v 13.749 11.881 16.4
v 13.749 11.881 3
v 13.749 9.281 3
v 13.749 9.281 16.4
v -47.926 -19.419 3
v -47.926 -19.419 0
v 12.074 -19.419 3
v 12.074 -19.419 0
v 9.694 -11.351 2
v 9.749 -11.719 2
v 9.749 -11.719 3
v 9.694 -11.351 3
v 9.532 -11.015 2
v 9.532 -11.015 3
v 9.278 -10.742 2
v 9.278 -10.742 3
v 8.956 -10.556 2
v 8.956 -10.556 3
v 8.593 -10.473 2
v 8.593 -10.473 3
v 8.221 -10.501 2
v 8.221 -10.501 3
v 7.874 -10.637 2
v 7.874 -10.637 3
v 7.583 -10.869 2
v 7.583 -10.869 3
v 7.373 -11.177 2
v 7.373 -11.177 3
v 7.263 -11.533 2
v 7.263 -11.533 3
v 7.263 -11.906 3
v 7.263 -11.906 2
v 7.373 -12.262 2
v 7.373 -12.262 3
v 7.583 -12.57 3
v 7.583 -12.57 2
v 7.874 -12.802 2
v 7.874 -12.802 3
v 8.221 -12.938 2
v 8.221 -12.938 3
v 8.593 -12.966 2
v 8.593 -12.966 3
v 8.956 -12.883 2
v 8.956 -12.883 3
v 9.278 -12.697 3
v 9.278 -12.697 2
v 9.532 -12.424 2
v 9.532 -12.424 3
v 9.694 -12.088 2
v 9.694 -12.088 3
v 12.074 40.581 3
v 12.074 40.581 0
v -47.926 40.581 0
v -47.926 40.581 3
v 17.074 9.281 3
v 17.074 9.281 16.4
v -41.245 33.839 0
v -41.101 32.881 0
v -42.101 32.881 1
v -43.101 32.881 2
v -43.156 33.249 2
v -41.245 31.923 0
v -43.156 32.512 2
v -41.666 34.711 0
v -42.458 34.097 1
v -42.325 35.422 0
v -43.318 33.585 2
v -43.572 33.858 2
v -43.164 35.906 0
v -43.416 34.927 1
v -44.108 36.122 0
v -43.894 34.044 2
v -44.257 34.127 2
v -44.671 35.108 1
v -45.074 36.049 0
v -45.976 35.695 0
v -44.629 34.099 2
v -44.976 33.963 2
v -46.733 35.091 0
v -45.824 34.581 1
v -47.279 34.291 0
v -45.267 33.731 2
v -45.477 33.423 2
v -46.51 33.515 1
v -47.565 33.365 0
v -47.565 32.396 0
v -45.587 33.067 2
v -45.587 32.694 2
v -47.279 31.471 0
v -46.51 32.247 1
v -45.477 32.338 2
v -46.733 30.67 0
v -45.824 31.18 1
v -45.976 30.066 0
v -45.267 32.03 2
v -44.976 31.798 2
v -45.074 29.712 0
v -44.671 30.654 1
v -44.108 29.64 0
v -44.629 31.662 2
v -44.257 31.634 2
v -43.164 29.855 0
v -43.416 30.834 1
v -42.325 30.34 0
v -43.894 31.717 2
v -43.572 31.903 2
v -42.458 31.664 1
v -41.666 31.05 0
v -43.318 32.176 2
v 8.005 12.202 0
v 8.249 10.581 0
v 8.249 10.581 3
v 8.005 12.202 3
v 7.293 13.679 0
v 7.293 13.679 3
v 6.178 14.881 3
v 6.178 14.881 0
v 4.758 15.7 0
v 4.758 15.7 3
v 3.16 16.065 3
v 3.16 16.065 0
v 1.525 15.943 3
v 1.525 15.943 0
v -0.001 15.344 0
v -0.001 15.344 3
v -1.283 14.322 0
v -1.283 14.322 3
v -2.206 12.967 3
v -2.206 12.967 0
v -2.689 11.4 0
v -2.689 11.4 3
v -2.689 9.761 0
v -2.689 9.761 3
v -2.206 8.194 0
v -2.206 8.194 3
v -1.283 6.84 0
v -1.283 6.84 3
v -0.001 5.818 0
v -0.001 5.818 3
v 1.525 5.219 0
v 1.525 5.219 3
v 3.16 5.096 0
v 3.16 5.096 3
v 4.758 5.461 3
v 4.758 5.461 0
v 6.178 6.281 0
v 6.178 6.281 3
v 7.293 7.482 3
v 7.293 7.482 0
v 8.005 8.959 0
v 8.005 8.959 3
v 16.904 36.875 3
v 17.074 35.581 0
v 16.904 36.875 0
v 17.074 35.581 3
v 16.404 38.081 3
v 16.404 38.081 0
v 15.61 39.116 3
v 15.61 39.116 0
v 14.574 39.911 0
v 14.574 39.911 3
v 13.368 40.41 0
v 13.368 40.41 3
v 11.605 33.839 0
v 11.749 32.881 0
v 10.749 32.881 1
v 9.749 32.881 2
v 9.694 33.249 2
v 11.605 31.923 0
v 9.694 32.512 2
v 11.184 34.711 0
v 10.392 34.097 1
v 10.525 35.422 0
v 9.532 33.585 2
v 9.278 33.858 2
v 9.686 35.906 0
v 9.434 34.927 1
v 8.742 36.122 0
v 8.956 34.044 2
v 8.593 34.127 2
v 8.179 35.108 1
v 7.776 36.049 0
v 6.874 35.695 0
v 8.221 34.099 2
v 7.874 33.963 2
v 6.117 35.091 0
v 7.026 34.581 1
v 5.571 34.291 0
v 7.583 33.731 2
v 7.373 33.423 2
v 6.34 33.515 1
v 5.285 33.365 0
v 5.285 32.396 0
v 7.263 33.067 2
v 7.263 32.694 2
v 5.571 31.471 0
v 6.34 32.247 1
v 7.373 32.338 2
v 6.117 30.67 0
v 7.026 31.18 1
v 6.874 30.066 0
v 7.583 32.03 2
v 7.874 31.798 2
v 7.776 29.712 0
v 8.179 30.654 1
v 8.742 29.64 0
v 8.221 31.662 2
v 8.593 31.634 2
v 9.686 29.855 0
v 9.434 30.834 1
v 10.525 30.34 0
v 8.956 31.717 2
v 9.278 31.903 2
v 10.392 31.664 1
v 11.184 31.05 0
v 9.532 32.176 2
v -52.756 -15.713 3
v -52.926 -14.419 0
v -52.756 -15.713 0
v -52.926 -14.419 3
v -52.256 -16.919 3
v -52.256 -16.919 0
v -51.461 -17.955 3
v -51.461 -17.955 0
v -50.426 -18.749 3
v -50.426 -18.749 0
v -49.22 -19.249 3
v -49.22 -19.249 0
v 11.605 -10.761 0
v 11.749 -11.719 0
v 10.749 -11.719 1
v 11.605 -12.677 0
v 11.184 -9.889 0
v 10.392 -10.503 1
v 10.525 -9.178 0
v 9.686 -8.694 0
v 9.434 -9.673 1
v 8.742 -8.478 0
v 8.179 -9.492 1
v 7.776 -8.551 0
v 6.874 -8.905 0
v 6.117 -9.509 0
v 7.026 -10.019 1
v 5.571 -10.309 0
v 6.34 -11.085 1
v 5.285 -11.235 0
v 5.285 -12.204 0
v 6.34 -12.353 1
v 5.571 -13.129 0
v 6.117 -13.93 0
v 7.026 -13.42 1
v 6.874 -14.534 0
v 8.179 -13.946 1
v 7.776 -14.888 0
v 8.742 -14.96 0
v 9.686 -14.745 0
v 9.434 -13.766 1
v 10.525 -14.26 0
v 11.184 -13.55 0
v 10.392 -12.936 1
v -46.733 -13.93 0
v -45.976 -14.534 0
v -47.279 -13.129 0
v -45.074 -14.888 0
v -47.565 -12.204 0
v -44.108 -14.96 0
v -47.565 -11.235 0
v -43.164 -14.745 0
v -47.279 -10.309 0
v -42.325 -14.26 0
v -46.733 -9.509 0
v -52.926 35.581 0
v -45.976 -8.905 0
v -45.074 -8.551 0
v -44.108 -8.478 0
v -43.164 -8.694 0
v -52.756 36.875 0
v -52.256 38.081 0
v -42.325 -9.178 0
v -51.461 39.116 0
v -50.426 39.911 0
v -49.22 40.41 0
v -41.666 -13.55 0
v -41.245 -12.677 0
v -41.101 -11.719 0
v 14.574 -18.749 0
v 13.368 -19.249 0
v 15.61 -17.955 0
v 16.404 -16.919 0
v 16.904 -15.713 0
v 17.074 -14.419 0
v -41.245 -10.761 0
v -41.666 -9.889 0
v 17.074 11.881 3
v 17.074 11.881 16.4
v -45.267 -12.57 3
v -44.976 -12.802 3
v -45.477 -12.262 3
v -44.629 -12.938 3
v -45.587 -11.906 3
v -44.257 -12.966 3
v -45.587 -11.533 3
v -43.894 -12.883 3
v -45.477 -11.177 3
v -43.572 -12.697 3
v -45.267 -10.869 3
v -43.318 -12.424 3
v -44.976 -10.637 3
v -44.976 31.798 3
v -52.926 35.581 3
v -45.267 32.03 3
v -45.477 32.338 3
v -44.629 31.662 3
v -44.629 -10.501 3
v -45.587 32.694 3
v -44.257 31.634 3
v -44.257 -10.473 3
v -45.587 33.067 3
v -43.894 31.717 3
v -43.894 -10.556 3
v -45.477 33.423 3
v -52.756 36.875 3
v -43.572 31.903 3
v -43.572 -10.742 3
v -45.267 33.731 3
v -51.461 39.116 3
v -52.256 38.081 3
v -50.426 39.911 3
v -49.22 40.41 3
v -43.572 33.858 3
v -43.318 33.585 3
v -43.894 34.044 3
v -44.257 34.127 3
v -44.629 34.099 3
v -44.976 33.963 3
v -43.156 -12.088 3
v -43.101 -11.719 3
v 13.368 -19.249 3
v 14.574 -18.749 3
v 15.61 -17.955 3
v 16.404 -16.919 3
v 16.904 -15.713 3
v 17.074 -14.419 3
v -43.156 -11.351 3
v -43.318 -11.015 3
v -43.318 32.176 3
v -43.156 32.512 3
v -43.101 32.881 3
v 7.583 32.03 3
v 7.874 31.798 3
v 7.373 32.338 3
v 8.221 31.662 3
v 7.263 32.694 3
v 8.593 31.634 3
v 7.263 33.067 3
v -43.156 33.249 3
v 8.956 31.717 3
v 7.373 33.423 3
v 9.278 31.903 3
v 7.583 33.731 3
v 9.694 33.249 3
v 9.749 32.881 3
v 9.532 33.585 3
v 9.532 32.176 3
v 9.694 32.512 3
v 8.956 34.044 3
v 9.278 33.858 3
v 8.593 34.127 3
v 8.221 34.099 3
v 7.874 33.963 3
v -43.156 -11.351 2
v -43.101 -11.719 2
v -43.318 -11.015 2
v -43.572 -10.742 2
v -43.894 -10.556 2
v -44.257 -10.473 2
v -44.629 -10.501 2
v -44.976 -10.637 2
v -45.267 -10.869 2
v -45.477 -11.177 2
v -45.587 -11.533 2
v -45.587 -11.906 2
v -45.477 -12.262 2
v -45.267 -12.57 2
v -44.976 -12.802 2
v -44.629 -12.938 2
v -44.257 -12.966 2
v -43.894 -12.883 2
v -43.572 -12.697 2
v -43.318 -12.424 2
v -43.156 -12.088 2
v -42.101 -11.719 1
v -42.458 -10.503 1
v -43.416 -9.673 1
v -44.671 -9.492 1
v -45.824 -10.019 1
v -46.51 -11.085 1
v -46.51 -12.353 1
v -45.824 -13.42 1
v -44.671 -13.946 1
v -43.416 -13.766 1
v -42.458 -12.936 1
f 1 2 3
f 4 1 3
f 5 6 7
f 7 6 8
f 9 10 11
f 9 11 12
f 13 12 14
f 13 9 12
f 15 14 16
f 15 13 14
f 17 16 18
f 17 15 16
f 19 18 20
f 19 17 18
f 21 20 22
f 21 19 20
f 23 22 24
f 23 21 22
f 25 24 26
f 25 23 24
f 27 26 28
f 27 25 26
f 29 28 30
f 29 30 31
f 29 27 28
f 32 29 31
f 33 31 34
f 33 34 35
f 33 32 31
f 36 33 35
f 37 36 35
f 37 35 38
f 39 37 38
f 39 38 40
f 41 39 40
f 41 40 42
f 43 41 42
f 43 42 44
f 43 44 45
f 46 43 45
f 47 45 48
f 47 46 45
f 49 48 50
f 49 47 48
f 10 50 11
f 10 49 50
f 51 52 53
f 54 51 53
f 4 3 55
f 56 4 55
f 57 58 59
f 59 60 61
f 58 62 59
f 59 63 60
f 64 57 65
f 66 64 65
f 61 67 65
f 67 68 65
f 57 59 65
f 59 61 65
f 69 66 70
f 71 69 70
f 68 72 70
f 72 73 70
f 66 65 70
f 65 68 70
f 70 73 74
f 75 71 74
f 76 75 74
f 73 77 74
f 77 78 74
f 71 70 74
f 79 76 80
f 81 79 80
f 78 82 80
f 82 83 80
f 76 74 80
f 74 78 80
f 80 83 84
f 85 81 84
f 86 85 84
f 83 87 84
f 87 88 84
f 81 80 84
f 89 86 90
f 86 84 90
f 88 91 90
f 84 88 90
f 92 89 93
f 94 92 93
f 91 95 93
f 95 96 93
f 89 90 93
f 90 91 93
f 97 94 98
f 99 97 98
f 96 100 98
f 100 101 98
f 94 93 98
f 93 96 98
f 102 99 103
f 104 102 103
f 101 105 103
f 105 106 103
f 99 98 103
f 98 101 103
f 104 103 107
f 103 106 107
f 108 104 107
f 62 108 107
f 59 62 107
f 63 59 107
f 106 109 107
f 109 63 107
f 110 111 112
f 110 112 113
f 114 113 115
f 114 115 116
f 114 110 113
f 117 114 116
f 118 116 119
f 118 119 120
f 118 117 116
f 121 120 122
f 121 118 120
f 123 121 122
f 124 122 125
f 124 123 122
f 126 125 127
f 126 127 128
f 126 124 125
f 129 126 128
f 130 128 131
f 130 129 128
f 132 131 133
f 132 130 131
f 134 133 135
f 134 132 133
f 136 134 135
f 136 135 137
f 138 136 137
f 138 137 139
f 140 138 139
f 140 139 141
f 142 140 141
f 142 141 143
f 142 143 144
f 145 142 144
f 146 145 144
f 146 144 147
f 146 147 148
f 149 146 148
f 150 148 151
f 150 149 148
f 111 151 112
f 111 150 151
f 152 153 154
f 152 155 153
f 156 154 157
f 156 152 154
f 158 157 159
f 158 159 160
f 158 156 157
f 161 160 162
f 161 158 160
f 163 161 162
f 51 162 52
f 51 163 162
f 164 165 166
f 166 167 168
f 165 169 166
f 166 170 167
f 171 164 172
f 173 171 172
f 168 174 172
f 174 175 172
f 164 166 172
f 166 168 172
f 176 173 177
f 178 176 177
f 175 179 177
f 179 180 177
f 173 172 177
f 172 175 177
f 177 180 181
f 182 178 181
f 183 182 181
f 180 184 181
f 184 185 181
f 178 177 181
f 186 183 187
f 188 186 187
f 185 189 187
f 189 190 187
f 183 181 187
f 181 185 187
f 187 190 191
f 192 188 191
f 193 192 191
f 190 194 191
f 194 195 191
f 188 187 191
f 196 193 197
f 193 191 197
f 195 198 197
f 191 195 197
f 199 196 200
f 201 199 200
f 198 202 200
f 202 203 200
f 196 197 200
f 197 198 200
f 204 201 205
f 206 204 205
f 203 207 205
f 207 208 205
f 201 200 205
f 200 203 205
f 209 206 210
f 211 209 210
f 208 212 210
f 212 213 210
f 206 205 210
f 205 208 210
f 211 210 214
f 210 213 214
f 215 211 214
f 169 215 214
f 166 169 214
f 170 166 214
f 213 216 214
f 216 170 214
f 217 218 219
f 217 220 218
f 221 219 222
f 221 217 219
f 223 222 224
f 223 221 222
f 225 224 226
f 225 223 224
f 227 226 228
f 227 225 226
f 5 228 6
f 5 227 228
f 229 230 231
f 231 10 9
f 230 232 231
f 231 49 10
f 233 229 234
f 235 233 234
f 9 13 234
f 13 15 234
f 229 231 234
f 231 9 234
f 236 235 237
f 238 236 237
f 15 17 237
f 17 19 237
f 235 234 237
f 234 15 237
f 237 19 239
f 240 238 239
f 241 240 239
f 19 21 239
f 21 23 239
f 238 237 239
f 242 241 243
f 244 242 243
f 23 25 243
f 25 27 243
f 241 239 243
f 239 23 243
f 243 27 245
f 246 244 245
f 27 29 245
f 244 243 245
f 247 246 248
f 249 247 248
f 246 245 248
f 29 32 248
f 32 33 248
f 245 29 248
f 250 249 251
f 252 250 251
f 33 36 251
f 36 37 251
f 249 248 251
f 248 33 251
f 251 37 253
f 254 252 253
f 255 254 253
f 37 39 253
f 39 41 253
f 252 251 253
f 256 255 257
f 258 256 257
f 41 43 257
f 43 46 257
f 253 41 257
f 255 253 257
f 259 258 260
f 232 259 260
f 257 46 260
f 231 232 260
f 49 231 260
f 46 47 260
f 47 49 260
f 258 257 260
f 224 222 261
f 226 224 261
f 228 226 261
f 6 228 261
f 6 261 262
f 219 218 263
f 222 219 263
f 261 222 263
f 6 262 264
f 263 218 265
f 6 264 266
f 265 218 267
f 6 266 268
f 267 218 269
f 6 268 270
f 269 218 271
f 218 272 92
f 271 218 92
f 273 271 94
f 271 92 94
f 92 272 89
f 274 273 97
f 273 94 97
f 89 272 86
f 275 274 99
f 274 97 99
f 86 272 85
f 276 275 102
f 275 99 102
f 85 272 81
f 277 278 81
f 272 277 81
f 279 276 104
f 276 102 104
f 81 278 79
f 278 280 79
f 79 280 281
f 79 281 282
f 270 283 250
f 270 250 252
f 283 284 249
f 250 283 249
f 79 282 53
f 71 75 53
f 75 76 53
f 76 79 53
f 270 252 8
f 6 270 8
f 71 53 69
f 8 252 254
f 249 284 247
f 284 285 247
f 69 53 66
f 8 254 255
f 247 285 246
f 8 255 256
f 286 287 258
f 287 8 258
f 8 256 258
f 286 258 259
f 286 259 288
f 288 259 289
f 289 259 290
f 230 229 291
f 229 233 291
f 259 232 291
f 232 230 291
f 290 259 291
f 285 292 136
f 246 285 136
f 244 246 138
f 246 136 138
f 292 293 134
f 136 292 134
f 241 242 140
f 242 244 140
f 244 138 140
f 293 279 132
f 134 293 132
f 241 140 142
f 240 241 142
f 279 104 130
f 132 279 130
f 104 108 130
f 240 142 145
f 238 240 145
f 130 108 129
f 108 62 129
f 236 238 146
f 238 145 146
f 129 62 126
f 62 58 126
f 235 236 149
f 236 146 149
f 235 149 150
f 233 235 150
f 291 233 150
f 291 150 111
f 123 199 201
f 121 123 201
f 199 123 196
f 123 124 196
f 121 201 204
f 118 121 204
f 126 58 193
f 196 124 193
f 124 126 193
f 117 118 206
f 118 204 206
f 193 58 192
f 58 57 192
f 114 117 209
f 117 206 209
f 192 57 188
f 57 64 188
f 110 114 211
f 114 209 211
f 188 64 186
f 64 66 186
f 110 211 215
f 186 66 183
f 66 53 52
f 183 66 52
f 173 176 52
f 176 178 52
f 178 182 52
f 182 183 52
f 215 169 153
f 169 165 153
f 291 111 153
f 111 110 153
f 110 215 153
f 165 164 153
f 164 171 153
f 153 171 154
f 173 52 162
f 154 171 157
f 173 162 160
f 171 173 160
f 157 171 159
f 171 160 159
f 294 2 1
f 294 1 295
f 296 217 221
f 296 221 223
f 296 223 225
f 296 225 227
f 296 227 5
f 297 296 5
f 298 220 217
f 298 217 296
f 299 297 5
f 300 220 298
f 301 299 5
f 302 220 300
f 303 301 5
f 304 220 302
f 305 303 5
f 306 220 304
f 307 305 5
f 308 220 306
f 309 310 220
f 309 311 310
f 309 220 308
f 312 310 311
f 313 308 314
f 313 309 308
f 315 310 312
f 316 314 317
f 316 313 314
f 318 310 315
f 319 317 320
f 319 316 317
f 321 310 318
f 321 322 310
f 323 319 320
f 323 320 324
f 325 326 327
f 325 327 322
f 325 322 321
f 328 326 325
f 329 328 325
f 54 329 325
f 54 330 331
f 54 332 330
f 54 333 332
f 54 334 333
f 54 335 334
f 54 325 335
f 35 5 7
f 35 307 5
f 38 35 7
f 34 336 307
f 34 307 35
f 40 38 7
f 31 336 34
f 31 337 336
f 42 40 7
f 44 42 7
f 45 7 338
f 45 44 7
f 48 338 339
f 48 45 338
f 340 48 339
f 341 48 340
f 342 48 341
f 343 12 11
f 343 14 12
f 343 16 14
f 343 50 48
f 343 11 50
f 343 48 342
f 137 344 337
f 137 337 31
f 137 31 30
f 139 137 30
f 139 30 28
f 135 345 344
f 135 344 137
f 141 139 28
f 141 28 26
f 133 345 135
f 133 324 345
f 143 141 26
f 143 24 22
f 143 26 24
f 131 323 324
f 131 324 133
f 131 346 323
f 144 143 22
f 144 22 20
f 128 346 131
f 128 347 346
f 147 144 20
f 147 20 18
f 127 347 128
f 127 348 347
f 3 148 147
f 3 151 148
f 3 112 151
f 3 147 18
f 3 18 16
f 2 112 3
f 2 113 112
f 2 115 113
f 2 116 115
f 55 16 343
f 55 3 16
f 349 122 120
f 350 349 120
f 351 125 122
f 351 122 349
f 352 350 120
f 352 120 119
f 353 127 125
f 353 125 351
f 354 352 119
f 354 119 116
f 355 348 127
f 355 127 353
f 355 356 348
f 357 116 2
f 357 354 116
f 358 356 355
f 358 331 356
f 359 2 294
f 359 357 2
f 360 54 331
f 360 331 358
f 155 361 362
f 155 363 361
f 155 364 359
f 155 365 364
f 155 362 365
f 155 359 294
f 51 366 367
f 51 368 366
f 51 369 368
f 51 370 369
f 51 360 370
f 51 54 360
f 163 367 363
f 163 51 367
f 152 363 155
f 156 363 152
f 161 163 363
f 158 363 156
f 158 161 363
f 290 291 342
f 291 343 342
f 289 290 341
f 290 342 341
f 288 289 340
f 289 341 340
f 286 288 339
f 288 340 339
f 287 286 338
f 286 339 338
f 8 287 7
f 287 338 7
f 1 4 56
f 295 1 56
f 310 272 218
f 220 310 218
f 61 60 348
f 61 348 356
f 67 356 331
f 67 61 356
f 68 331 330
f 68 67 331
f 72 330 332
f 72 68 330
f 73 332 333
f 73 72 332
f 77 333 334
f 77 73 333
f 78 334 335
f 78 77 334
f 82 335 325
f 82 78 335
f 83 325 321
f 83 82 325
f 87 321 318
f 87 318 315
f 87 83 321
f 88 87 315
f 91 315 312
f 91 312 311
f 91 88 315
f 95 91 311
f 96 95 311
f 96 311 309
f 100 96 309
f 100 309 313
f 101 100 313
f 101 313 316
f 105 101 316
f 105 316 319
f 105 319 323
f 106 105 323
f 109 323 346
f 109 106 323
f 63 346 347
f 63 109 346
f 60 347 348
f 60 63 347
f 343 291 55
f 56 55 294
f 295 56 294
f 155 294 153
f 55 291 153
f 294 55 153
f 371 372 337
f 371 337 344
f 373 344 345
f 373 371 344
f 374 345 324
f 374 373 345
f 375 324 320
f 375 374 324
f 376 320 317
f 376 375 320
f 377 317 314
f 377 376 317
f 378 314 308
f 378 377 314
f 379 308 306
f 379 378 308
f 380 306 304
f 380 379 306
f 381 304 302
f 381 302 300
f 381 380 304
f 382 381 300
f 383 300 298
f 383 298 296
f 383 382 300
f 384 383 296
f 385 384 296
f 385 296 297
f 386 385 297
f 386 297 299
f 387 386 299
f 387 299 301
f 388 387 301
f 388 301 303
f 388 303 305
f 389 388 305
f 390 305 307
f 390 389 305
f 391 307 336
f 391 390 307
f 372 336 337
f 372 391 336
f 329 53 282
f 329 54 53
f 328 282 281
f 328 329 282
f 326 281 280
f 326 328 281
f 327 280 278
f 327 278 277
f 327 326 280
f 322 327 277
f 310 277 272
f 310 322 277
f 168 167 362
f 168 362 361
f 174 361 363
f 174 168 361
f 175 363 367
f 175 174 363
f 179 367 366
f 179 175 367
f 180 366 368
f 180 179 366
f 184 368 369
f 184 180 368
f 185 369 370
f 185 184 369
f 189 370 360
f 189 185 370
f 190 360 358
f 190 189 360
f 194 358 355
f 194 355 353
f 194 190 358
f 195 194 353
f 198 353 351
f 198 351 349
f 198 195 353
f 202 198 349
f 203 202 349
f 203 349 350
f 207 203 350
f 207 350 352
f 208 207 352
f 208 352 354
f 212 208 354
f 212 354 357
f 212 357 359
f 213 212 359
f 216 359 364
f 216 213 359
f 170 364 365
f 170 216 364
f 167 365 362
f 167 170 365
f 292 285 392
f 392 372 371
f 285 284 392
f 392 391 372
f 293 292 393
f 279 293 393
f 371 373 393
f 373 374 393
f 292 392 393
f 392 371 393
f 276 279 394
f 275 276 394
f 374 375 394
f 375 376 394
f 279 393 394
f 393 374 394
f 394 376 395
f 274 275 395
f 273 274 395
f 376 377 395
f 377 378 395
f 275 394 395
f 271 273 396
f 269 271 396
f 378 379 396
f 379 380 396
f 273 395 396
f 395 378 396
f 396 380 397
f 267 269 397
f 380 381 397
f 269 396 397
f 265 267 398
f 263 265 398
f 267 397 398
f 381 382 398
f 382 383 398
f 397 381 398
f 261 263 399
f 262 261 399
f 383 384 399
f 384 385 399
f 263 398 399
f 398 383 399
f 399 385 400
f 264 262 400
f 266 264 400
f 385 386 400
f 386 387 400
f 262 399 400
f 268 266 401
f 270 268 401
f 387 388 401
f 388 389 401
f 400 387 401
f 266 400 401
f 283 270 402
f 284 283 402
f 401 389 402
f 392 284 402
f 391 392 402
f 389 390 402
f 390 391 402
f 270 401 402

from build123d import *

# Parameters (mm, degrees)
F0_R     = 1.25
F0_R_2   = 5.5
F1_DEPTH = 3
F2_W     = 3.325
F2_H     = 2.6
F3_DEPTH = 16.4
F4_SIZE  = 2
F5_R     = 5


with BuildPart() as f1:
    # F0 (on Top) → F1 (new body)
    with BuildSketch(Plane.XY):
        with BuildLine():
            Line((17.074093, -19.419351), (17.074093, 9.280649))
            Line((17.074093, 9.280649), (13.749093, 9.280649))
            Line((13.749093, 9.280649), (13.749093, -4.019351))
            Line((13.749093, -4.019351), (3.249093, -4.019351))
            Line((3.249093, -4.019351), (3.249093, -5.947351))
            ThreePointArc((3.249093, -5.947351), (-0.850907, -10.047351), (-4.950907, -5.947351))
            Line((-4.950907, -5.947351), (-4.950907, -4.019351))
            Line((-4.950907, -4.019351), (-30.900907, -4.019351))
            Line((-30.900907, -4.019351), (-30.900907, -5.947351))
            ThreePointArc((-30.900907, -5.947351), (-35.000907, -10.047351), (-39.100907, -5.947351))
            Line((-39.100907, -5.947351), (-39.100907, -4.019351))
            Line((-39.100907, -4.019351), (-49.600907, -4.019351))
            Line((-49.600907, -4.019351), (-49.600907, 25.180649))
            Line((-49.600907, 25.180649), (-39.100907, 25.180649))
            Line((-39.100907, 25.180649), (-39.100907, 27.108649))
            ThreePointArc((-39.100907, 27.108649), (-35.000907, 31.208649), (-30.900907, 27.108649))
            Line((-30.900907, 27.108649), (-30.900907, 25.180649))
            Line((-30.900907, 25.180649), (-4.950907, 25.180649))
            Line((-4.950907, 25.180649), (-4.950907, 27.108649))
            ThreePointArc((-4.950907, 27.108649), (-0.850907, 31.208649), (3.249093, 27.108649))
            Line((3.249093, 27.108649), (3.249093, 25.180649))
            Line((3.249093, 25.180649), (13.749093, 25.180649))
            Line((13.749093, 25.180649), (13.749093, 11.880649))
            Line((13.749093, 11.880649), (17.074093, 11.880649))
            Line((17.074093, 11.880649), (17.074093, 40.580649))
            Line((17.074093, 40.580649), (-52.925907, 40.580649))
            Line((-52.925907, 40.580649), (-52.925907, -19.419351))
            Line((-52.925907, -19.419351), (17.074093, -19.419351))
        make_face()
        with Locations((-44.350907, -11.719351)):
            Circle(F0_R, mode=Mode.SUBTRACT)
        with Locations((8.499093, -11.719351)):
            Circle(F0_R, mode=Mode.SUBTRACT)
        with Locations((-44.350907, 32.880649)):
            Circle(F0_R, mode=Mode.SUBTRACT)
        with Locations((8.499093, 32.880649)):
            Circle(F0_R, mode=Mode.SUBTRACT)
        with BuildLine():
            Line((13.749093, -4.019351), (13.749093, 9.280649))
            Line((13.749093, 9.280649), (13.749093, 11.880649))
            Line((13.749093, 11.880649), (13.749093, 25.180649))
            Line((13.749093, 25.180649), (3.249093, 25.180649))
            Line((3.249093, 25.180649), (3.249093, 27.108649))
            ThreePointArc((3.249093, 27.108649), (-0.850907, 31.208649), (-4.950907, 27.108649))
            Line((-4.950907, 27.108649), (-4.950907, 25.180649))
            Line((-4.950907, 25.180649), (-30.900907, 25.180649))
            Line((-30.900907, 25.180649), (-30.900907, 27.108649))
            ThreePointArc((-30.900907, 27.108649), (-35.000907, 31.208649), (-39.100907, 27.108649))
            Line((-39.100907, 27.108649), (-39.100907, 25.180649))
            Line((-39.100907, 25.180649), (-49.600907, 25.180649))
            Line((-49.600907, 25.180649), (-49.600907, -4.019351))
            Line((-49.600907, -4.019351), (-39.100907, -4.019351))
            Line((-39.100907, -4.019351), (-39.100907, -5.947351))
            ThreePointArc((-39.100907, -5.947351), (-35.000907, -10.047351), (-30.900907, -5.947351))
            Line((-30.900907, -5.947351), (-30.900907, -4.019351))
            Line((-30.900907, -4.019351), (-4.950907, -4.019351))
            Line((-4.950907, -4.019351), (-4.950907, -5.947351))
            ThreePointArc((-4.950907, -5.947351), (-0.850907, -10.047351), (3.249093, -5.947351))
            Line((3.249093, -5.947351), (3.249093, -4.019351))
            Line((3.249093, -4.019351), (13.749093, -4.019351))
        make_face()
        with Locations((2.749093, 10.580649)):
            Circle(F0_R_2, mode=Mode.SUBTRACT)
    extrude(amount=F1_DEPTH)

    # F2 (on face) → F3 (join)
    with BuildSketch(Plane(origin=(0, 0, 0), x_dir=(1, 0, 0), z_dir=(0, 0, -1))):
        with Locations((15.411593, -10.580649)):
            Rectangle(F2_W, F2_H)
    extrude(amount=-F3_DEPTH)

    # F4
    f4_edges = [f1.edges().sort_by_distance(p)[0] for p in [
        (-45.600907, -11.719351, 0),
        (-45.600907, 32.880649, 0),
        (7.249093, 32.880649, 0),
        (7.249093, -11.719351, 0),
    ]]
    chamfer(f4_edges, length=F4_SIZE)

    # F5
    f5_edges = [f1.edges().sort_by_distance(p)[0] for p in [
        (-52.925907, -19.419351, 1.5),
        (17.074093, -19.419351, 1.5),
        (17.074093, 40.580649, 1.5),
        (-52.925907, 40.580649, 1.5),
    ]]
    fillet(f5_edges, radius=F5_R)


solid = f1.part
